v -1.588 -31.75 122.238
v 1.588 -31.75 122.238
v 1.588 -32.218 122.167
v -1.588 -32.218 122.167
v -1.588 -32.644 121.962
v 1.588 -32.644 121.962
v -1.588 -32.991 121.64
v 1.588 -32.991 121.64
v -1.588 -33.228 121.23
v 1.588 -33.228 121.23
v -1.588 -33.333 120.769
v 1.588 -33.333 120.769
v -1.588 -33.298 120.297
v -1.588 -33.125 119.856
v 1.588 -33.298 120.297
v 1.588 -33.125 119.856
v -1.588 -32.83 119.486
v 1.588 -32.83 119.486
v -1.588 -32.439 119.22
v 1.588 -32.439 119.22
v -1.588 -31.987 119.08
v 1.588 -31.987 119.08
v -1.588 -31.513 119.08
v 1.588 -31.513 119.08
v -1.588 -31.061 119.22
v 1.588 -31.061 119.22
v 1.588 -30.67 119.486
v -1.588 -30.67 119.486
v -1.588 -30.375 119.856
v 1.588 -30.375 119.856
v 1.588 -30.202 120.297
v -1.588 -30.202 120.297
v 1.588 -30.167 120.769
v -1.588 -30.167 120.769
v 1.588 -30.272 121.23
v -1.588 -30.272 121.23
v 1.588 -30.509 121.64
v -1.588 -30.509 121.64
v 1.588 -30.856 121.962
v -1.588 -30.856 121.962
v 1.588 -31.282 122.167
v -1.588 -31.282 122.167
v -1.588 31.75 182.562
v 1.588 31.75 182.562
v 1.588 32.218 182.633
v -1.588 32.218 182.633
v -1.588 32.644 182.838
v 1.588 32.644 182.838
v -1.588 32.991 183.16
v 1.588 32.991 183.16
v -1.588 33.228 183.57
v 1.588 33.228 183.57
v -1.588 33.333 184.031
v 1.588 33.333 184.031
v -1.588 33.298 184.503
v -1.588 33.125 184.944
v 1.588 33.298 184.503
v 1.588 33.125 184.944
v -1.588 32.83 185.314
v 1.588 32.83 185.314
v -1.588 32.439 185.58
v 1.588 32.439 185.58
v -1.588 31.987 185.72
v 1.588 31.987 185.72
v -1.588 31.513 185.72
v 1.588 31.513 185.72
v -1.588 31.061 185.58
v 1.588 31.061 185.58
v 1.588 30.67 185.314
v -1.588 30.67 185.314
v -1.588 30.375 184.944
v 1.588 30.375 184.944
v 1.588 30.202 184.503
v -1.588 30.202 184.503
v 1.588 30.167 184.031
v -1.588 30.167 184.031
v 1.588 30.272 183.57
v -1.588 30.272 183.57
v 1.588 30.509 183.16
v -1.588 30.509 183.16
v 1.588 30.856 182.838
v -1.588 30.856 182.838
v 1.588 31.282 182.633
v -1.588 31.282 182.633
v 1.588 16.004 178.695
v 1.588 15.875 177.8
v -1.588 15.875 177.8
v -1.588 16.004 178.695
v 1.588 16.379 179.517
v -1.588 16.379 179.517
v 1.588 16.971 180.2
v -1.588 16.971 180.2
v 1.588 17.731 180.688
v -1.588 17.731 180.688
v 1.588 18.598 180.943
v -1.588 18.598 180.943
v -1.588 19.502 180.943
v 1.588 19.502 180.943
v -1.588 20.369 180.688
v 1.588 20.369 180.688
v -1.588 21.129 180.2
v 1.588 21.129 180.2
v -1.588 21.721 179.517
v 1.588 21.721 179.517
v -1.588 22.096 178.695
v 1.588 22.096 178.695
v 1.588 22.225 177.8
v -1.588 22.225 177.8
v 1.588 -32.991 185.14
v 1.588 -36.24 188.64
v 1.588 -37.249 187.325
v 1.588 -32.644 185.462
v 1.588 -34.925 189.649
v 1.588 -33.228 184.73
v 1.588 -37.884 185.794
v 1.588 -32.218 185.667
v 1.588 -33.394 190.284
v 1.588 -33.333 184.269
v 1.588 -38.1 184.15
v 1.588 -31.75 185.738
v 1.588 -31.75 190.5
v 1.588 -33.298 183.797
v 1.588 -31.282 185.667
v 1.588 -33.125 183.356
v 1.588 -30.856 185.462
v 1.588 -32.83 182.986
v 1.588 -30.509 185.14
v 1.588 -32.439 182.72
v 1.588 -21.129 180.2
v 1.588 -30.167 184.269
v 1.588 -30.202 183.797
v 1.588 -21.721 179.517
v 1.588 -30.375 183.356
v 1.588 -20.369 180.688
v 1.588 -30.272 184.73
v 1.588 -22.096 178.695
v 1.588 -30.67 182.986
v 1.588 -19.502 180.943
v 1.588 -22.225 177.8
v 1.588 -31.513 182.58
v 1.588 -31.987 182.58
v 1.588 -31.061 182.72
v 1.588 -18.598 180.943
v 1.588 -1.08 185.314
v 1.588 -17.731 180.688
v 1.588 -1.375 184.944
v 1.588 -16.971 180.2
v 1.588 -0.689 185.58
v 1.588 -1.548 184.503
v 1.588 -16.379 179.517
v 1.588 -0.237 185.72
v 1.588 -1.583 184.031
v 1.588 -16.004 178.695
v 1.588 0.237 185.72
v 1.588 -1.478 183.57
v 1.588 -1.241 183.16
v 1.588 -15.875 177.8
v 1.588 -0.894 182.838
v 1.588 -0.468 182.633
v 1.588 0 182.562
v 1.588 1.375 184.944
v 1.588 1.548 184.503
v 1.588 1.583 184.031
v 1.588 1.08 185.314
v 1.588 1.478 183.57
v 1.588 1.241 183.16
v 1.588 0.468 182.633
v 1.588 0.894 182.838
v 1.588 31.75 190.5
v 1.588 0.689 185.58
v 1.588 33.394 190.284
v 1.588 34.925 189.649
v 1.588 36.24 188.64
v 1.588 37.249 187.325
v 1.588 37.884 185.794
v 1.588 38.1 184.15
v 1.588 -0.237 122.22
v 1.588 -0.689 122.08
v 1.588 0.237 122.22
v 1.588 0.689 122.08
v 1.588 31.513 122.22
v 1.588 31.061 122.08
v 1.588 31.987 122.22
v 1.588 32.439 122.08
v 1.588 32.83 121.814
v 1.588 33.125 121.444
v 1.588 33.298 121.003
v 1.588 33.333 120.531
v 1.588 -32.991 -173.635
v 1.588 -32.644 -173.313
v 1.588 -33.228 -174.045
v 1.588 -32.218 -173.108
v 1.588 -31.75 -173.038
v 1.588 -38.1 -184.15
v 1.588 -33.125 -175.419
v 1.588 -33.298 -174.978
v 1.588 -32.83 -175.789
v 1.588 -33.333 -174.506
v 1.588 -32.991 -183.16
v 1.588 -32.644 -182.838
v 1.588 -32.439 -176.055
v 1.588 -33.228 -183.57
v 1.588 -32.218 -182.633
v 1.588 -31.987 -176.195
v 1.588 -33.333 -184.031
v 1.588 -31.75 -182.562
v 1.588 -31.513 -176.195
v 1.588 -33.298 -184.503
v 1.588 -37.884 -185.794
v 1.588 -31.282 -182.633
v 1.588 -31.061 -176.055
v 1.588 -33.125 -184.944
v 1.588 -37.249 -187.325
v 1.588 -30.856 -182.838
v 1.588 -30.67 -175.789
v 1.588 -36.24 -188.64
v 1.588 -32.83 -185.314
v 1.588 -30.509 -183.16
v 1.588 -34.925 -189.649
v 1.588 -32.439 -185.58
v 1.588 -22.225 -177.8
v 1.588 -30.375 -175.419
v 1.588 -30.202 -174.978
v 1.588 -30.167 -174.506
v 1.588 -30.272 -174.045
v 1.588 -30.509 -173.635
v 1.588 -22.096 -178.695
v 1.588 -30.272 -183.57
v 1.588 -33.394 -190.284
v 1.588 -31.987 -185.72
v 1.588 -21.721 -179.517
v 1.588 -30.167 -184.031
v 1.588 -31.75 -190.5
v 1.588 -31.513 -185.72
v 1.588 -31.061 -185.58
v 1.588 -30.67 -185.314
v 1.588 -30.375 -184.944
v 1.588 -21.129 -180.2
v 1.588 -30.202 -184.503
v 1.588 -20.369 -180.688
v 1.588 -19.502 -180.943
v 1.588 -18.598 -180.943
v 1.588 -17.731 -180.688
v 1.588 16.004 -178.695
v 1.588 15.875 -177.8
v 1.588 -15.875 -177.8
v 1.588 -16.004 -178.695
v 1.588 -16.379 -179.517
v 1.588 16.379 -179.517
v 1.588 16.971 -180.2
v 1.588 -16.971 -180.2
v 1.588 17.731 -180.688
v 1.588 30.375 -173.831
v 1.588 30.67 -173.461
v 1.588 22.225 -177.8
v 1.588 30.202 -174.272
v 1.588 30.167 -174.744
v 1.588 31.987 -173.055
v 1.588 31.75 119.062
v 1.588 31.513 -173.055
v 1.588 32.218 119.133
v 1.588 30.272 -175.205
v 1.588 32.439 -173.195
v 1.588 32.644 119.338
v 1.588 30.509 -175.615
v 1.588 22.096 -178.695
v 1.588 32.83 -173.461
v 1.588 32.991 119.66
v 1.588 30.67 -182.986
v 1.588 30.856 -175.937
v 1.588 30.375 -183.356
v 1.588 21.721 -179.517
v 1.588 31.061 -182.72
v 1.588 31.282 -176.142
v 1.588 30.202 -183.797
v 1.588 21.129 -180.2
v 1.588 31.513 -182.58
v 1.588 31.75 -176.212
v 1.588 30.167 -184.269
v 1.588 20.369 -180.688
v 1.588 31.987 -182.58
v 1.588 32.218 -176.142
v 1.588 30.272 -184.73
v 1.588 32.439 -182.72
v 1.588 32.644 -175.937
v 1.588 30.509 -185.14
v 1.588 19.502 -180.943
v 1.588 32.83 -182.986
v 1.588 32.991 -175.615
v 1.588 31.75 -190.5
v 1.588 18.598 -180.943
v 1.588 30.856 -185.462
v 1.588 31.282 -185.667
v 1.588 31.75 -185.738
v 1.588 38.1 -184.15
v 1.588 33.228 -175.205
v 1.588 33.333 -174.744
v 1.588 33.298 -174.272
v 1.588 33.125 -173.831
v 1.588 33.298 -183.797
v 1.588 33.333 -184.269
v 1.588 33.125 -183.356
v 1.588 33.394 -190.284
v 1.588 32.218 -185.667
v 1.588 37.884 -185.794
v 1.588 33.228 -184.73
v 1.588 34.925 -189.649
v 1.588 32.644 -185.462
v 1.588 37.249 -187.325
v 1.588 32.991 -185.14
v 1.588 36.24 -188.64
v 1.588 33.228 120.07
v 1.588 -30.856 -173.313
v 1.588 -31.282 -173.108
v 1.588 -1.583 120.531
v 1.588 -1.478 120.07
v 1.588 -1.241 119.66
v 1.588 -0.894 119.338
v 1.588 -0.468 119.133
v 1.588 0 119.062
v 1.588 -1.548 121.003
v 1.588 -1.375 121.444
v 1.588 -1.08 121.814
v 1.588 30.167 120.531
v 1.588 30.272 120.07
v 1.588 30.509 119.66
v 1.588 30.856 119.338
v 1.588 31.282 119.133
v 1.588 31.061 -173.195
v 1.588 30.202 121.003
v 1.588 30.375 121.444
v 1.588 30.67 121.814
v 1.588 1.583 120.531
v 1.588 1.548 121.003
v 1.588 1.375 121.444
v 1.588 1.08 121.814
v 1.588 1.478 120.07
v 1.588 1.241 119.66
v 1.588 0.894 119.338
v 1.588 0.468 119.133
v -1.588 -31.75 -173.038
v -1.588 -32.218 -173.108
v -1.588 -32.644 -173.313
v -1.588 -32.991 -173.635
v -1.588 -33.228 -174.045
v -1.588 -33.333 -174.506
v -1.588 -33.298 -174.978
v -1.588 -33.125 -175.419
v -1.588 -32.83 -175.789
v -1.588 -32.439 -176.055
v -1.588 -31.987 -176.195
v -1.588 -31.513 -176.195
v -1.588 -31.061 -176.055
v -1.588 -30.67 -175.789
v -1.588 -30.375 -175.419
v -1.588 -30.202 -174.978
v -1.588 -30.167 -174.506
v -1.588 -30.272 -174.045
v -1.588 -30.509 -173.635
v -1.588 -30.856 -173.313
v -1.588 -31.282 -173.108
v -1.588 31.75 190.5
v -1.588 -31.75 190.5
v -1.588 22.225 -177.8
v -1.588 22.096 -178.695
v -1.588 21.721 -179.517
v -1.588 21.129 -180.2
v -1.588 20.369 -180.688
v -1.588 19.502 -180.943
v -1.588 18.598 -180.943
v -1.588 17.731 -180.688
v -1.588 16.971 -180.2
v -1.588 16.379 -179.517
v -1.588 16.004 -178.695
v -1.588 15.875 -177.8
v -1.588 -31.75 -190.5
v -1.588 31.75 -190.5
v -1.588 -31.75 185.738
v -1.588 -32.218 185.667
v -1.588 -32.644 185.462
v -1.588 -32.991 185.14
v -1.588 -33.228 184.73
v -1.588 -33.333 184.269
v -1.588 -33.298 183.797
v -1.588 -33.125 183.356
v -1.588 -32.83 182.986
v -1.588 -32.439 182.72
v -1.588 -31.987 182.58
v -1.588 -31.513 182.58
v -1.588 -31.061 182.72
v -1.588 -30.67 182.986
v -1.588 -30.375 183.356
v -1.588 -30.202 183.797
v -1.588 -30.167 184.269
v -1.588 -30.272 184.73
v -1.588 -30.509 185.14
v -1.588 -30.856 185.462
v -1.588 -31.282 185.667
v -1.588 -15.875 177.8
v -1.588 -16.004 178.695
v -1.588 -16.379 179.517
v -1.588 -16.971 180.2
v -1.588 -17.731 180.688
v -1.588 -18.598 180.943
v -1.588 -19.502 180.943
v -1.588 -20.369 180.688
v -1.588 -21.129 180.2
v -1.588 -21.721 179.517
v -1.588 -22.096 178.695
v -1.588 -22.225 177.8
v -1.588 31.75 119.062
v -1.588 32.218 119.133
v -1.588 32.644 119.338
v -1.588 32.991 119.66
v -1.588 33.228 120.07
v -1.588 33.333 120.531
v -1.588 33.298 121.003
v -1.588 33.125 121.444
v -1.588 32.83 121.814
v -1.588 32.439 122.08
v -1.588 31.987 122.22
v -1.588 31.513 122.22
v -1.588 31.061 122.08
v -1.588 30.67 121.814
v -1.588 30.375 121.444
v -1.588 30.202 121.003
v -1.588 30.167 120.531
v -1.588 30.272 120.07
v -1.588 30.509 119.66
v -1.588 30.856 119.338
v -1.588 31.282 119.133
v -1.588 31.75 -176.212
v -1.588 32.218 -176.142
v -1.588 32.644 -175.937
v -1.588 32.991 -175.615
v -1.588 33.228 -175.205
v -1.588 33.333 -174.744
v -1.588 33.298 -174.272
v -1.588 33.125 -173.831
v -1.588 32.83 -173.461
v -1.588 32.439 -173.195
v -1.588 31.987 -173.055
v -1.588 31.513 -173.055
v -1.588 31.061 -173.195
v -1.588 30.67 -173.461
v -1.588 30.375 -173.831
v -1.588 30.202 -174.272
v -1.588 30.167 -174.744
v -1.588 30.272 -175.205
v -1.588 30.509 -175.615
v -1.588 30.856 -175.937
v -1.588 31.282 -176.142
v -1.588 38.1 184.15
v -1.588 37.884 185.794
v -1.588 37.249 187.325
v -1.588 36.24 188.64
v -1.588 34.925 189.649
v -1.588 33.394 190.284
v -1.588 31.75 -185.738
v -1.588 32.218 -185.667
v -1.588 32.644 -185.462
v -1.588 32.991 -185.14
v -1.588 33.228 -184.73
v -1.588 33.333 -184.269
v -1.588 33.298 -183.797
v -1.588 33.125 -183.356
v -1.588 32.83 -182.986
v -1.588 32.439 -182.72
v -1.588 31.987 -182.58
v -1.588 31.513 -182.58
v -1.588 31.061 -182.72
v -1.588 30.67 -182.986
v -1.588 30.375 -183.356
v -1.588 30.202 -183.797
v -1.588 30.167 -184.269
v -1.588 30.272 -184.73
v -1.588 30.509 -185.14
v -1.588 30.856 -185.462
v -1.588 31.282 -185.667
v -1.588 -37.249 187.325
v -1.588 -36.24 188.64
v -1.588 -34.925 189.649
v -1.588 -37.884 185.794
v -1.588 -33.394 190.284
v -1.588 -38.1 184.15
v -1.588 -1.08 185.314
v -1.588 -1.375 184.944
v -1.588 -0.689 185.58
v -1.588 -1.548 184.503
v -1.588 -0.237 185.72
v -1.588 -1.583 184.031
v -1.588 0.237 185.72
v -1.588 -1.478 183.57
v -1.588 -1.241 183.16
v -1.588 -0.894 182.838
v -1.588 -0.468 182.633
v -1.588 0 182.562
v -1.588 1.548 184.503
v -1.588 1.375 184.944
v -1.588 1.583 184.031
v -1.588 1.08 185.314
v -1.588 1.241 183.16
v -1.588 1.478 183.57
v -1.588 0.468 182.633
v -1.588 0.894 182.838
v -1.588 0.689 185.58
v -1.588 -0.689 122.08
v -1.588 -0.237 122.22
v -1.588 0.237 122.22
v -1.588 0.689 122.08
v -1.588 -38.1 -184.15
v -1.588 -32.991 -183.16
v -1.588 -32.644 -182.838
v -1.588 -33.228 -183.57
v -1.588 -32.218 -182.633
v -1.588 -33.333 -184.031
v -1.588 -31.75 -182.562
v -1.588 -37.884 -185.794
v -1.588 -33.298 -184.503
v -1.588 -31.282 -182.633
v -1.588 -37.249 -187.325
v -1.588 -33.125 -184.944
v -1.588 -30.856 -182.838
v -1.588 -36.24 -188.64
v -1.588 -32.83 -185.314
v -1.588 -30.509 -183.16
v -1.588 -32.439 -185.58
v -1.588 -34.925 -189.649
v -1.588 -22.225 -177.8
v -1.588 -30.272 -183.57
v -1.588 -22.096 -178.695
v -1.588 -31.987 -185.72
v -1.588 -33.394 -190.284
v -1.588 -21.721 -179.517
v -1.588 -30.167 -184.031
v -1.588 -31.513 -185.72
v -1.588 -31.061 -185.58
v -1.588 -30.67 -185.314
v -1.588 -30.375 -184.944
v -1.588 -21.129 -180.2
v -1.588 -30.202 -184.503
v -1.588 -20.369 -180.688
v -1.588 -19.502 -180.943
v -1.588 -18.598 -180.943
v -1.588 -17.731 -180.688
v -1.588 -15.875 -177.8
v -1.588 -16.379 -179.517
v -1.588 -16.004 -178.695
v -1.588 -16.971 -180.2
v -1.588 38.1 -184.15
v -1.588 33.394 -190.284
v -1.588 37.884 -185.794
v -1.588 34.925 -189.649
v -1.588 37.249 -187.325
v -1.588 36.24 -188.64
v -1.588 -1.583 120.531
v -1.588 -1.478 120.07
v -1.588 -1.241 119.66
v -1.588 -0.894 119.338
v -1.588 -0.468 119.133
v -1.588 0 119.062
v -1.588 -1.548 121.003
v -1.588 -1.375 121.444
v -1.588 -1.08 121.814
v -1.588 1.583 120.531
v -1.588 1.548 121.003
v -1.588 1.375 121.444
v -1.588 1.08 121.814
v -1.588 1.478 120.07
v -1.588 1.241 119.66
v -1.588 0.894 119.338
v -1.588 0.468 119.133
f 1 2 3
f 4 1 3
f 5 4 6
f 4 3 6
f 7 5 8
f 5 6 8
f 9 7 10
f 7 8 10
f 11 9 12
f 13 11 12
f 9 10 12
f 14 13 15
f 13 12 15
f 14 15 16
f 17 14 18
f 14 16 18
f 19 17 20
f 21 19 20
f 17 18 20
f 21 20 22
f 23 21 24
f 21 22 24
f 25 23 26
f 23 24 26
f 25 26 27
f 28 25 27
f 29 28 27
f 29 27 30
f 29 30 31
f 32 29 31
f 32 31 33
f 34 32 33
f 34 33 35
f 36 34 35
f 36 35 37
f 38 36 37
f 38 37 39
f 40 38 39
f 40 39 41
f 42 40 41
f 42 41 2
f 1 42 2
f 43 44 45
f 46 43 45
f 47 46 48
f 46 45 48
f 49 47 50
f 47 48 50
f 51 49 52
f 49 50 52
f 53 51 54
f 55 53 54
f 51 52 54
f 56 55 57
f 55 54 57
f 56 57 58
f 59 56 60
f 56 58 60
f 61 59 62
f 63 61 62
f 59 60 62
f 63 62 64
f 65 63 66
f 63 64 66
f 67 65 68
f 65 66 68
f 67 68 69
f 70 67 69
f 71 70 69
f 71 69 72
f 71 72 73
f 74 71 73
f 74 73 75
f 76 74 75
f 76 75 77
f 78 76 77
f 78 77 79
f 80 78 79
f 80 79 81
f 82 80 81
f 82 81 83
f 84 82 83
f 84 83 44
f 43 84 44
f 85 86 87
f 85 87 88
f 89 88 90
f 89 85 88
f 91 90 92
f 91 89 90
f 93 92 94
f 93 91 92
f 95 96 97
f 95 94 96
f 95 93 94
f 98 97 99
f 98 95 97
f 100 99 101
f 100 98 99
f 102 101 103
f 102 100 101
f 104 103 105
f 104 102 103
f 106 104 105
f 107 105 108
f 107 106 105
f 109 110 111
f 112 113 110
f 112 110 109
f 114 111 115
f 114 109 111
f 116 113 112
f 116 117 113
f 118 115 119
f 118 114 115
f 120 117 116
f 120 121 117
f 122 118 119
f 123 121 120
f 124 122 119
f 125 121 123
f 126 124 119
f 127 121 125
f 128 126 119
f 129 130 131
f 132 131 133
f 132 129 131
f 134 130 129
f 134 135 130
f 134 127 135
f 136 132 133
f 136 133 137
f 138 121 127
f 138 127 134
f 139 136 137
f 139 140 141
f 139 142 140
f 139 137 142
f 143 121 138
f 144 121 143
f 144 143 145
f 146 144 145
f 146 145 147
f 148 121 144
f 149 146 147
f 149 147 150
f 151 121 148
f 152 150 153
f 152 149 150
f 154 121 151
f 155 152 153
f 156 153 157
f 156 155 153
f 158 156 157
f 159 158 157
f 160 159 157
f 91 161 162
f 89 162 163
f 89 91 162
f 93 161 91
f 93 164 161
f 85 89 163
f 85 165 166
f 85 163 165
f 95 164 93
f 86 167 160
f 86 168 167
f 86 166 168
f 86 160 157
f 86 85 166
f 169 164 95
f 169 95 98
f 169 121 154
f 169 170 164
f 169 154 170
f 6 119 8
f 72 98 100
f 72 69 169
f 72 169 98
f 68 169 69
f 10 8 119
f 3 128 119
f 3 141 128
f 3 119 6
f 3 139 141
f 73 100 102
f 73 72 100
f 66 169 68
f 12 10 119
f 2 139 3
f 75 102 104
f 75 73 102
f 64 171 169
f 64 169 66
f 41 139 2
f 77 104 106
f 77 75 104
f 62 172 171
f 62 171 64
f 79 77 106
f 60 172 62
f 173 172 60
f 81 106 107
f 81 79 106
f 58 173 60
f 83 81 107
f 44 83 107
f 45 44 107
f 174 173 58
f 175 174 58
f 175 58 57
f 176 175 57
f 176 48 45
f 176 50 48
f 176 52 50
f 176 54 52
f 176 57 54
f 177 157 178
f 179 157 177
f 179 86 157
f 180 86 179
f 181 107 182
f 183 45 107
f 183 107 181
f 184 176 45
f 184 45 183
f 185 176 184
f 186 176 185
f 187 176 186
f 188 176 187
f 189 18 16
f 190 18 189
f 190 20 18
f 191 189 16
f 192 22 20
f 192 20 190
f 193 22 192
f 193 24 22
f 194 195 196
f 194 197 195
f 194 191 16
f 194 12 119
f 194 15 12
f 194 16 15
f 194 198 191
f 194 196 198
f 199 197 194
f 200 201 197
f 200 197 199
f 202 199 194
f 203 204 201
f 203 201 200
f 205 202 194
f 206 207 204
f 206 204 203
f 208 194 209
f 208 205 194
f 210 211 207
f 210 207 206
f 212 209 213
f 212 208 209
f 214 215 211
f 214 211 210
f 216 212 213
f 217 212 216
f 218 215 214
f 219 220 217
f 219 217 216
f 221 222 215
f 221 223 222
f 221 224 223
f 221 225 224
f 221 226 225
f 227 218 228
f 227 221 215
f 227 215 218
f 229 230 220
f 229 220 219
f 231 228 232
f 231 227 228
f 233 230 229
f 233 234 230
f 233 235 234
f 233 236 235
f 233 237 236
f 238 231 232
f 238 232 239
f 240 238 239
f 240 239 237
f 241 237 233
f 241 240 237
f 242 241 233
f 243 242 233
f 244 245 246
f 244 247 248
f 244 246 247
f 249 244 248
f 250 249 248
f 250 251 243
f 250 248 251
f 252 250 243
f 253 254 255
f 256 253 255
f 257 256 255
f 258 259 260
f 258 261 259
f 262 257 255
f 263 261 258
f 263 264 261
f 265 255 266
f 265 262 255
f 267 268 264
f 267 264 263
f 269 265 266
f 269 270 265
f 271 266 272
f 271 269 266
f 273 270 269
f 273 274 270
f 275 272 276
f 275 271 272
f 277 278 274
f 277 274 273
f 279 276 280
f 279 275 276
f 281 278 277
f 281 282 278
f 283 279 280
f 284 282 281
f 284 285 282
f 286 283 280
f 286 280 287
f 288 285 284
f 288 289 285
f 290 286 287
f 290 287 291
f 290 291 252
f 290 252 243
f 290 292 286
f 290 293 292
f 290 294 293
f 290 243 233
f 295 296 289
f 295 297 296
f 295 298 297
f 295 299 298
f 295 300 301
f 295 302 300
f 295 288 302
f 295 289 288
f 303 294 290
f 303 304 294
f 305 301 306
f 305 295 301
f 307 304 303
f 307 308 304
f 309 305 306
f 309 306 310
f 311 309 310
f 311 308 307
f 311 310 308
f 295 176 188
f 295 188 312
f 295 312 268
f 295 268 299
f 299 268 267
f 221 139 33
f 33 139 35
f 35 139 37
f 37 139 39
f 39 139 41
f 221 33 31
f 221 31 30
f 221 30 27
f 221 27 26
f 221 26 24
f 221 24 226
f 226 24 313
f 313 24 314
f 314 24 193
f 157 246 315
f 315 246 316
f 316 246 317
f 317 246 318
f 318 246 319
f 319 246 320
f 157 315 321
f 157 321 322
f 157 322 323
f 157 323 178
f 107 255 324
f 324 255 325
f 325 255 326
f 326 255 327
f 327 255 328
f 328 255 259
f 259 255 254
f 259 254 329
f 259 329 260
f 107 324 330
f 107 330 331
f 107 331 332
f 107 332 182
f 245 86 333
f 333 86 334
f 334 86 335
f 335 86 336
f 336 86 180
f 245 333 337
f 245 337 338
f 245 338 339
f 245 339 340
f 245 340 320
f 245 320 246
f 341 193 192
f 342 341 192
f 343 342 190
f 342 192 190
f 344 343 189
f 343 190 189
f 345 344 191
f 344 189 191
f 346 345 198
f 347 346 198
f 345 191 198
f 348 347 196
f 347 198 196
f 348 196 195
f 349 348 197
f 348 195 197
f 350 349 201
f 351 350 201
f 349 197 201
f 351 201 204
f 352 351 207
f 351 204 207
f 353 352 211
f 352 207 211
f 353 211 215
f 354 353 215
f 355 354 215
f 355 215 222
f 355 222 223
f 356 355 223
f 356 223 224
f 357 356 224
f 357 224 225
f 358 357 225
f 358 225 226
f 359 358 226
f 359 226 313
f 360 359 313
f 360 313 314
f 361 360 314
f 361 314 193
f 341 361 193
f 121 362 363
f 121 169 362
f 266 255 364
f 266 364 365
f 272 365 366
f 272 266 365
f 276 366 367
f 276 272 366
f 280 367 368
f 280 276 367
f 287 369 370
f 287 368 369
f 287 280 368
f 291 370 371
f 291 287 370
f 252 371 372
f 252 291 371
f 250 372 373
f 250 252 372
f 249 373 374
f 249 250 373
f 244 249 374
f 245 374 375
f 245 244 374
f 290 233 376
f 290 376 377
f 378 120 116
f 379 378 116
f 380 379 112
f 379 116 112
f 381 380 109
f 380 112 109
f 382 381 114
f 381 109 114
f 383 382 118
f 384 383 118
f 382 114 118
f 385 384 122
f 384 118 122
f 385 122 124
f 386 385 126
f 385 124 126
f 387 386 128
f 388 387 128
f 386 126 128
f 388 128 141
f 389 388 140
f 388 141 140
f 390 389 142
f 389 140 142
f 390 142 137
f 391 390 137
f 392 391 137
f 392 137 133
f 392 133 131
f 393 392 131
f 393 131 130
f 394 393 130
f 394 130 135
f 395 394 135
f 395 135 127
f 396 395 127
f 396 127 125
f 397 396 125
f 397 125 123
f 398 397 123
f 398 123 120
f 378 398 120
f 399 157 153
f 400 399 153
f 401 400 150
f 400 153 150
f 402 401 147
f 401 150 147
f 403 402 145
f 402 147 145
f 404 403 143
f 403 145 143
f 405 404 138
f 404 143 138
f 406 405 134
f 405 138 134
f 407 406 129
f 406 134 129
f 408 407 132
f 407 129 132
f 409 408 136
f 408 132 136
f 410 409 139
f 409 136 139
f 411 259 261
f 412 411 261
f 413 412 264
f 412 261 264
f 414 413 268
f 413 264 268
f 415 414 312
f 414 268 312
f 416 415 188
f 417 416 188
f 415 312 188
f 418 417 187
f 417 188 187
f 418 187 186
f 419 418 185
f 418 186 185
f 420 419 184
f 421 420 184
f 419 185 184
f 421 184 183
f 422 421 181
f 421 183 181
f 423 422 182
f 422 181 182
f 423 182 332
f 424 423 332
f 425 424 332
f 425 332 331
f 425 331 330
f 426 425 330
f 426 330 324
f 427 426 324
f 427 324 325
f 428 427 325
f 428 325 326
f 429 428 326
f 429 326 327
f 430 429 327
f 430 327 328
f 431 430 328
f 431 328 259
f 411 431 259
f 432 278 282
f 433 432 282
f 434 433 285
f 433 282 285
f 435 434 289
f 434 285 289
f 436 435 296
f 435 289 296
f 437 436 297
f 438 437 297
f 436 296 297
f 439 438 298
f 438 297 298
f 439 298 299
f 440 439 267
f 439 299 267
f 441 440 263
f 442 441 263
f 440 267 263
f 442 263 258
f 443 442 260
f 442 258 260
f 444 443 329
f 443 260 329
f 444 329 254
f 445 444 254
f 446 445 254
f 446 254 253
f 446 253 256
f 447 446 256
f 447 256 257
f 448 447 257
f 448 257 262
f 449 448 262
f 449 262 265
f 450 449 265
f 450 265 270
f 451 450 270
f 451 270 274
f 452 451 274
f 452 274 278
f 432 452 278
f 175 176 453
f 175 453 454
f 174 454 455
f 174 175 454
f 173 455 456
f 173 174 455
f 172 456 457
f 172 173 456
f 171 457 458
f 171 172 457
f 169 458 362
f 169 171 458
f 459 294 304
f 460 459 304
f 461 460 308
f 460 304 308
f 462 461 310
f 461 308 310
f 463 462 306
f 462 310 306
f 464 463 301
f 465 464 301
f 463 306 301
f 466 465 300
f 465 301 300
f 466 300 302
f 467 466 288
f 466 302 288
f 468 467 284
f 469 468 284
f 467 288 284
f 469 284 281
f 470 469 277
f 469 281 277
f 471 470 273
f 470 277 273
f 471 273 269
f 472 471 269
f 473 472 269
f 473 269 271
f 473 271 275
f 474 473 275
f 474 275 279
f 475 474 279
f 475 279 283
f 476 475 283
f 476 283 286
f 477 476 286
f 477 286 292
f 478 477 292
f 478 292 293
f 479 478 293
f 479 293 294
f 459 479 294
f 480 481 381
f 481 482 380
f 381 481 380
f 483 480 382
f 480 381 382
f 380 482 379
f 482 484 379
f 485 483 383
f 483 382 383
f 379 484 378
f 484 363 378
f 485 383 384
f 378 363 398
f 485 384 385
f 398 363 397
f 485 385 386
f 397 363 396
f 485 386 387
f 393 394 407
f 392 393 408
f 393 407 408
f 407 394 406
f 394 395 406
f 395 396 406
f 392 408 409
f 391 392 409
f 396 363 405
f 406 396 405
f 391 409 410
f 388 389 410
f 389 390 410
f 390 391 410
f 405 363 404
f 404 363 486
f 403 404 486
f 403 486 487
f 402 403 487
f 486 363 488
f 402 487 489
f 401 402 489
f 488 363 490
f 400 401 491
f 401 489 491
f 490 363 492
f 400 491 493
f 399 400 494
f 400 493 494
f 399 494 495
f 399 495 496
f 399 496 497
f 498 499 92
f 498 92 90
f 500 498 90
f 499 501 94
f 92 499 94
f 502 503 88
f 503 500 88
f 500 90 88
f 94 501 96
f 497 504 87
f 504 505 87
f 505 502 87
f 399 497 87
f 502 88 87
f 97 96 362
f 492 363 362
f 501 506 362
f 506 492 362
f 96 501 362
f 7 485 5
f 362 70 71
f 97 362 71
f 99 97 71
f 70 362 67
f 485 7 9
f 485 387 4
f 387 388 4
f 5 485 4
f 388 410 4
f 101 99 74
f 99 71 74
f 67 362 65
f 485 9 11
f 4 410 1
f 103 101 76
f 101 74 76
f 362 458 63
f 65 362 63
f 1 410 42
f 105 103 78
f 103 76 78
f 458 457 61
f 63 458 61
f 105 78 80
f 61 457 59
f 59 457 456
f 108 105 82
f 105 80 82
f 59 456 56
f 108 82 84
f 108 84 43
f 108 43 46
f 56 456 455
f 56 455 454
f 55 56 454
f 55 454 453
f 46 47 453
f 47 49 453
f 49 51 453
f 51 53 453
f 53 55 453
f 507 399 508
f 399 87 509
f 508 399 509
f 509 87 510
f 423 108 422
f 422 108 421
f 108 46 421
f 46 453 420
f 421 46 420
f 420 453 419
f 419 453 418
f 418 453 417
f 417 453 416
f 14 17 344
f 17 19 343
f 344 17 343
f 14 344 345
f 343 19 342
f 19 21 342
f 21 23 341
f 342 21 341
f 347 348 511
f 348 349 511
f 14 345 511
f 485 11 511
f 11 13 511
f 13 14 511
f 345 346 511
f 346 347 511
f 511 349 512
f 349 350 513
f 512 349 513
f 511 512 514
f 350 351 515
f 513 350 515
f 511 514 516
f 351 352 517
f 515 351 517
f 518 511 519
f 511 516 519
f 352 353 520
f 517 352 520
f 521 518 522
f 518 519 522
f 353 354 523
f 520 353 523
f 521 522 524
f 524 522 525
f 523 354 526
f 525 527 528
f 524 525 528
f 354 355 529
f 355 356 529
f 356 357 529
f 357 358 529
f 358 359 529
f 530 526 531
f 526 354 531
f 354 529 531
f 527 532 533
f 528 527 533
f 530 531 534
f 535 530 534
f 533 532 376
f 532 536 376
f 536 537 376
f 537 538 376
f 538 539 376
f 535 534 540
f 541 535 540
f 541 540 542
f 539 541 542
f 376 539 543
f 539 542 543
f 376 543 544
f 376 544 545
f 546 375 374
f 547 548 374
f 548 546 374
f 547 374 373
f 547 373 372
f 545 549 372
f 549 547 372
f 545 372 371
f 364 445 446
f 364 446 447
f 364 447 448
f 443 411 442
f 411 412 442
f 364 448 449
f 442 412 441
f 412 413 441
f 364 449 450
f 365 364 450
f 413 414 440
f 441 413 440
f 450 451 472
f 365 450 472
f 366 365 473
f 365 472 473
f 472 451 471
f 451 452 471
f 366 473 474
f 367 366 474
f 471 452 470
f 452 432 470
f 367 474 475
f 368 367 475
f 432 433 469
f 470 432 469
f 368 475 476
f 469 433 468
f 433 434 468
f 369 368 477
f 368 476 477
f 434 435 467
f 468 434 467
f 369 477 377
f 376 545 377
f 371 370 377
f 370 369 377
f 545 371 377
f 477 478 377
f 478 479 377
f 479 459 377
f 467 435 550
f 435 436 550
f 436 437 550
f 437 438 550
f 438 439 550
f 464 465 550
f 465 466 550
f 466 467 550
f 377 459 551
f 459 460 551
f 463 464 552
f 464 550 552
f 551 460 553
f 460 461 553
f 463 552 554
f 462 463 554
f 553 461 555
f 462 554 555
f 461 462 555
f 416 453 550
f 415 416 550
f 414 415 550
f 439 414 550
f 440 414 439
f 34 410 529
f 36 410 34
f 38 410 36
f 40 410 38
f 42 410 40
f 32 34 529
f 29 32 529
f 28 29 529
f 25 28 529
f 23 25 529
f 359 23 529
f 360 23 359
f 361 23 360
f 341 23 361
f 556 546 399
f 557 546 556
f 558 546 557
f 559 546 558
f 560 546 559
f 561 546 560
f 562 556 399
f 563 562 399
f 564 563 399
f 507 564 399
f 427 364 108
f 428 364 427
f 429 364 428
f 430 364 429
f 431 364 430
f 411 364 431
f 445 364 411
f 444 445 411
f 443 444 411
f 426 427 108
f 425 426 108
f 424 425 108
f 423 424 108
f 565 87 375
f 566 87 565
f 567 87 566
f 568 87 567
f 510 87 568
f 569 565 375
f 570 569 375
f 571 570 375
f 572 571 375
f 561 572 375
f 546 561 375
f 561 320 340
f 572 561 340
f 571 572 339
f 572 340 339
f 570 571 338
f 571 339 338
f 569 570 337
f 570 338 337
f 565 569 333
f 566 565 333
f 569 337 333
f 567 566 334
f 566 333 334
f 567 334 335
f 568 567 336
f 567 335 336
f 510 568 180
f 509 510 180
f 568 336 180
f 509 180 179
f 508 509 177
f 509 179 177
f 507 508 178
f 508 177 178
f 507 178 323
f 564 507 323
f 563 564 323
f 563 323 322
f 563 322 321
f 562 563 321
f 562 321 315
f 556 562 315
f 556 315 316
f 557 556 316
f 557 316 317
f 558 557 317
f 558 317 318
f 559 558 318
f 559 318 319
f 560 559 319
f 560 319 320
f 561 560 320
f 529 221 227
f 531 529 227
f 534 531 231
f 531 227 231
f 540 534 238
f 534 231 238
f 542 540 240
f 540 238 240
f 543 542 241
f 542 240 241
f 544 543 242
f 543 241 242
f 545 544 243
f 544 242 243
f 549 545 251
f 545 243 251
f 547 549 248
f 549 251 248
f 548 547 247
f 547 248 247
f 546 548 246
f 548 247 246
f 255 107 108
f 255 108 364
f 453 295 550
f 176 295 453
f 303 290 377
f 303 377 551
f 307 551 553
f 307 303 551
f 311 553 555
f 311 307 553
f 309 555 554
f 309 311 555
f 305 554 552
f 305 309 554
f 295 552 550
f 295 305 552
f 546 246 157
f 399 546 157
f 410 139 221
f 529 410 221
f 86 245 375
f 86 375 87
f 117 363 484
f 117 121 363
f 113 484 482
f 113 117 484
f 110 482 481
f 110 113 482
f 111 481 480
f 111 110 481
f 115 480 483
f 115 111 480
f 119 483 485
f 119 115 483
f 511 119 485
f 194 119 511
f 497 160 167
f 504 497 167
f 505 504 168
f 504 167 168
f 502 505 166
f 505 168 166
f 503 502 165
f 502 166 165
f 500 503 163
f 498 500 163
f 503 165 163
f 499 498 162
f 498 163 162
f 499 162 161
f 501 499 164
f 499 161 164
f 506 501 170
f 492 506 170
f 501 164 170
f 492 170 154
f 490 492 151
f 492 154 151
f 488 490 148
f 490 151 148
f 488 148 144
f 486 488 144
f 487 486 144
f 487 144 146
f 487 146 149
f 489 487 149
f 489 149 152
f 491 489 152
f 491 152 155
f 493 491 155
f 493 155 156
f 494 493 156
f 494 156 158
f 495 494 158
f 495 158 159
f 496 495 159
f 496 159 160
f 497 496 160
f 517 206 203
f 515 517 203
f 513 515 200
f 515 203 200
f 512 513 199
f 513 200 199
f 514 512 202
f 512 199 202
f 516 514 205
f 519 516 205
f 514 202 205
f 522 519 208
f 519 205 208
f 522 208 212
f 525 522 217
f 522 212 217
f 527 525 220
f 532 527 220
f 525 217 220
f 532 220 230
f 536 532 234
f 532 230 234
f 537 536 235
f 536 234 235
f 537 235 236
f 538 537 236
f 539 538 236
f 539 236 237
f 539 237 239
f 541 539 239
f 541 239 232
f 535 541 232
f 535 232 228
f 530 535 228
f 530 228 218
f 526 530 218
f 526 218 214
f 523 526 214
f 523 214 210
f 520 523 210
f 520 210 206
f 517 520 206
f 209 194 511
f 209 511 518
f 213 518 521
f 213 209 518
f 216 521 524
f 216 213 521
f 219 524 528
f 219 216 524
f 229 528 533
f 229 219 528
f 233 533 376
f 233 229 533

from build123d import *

# Parameters (mm, degrees)
OUTER_CUT_DEPTH    = 1.5875
SLOTS_DEPTH        = 195.298586266
SKETCH3_R          = 1.5875
MOUNT_HOLES_DEPTH  = 195.298586266
SKETCH4_R          = 1.5875
CUT_EXTRUDE1_DEPTH = 195.298586266


with BuildPart() as part:
    # Sketch1 → Outer Cut (new, symmetric)
    with BuildSketch(Plane(origin=(0, 0, 0), x_dir=(0, 0, -1), z_dir=(1, 0, 0))):
        with BuildLine():
            Line((-184.15, -38.1), (184.15, -38.1))
            ThreePointArc((184.15, -38.1), (188.640128061, -36.240128061), (190.5, -31.75))
            Line((190.5, -31.75), (190.5, 31.75))
            ThreePointArc((190.5, 31.75), (188.640128061, 36.240128061), (184.15, 38.1))
            Line((184.15, 38.1), (-184.15, 38.1))
            ThreePointArc((-184.15, 38.1), (-188.640128061, 36.240128061), (-190.5, 31.75))
            Line((-190.5, 31.75), (-190.5, -31.75))
            ThreePointArc((-190.5, -31.75), (-188.640128061, -36.240128061), (-184.15, -38.1))
        make_face()
    extrude(amount=OUTER_CUT_DEPTH, both=True)

    # Sketch2 → Slots (cut, through all)
    with BuildSketch(Plane(origin=(1.5875, 0, 0), x_dir=(0, 0, -1), z_dir=(1, 0, 0))):
        with BuildLine():
            Line((-177.8, 22.225), (177.8, 22.225))
            ThreePointArc((177.8, 22.225), (180.975, 19.05), (177.8, 15.875))
            Line((177.8, 15.875), (-177.8, 15.875))
            ThreePointArc((-177.8, 15.875), (-180.975, 19.05), (-177.8, 22.225))
        make_face()
        with BuildLine():
            Line((-177.8, -22.225), (177.8, -22.225))
            ThreePointArc((177.8, -22.225), (180.975, -19.05), (177.8, -15.875))
            Line((177.8, -15.875), (-177.8, -15.875))
            ThreePointArc((-177.8, -15.875), (-180.975, -19.05), (-177.8, -22.225))
        make_face()
    extrude(amount=-SLOTS_DEPTH, mode=Mode.SUBTRACT)

    # Sketch3 → Mount Holes (cut, through all)
    with BuildSketch(Plane(origin=(1.5875, 0, 0), x_dir=(0, 0, -1), z_dir=(1, 0, 0))):
        with Locations((-184.15, 31.75)):
            Circle(SKETCH3_R)
        with Locations((-120.65, 31.75)):
            Circle(SKETCH3_R)
        with Locations(Location((-120.65, -31.75, 0), (0, 0, 180))):
            Circle(SKETCH3_R)
        with Locations(Location((-184.15, -31.75, 0), (0, 0, 180))):
            Circle(SKETCH3_R)
        with Locations((-184.15, 0)):
            Circle(SKETCH3_R)
        with Locations((-120.65, 0)):
            Circle(SKETCH3_R)
    extrude(amount=-MOUNT_HOLES_DEPTH, mode=Mode.SUBTRACT)

    # Sketch4 → Cut-Extrude1 (cut, through all)
    with BuildSketch(Plane(origin=(1.5875, 0, 0), x_dir=(0, 0, -1), z_dir=(1, 0, 0))):
        with Locations((184.15, 31.75)):
            Circle(SKETCH4_R)
        with Locations((174.625, 31.75)):
            Circle(SKETCH4_R)
        with Locations(Location((174.625, -31.75, 0), (0, 0, 180))):
            Circle(SKETCH4_R)
        with Locations(Location((184.15, -31.75, 0), (0, 0, 180))):
            Circle(SKETCH4_R)
    extrude(amount=-CUT_EXTRUDE1_DEPTH, mode=Mode.SUBTRACT)


solid = part.part
